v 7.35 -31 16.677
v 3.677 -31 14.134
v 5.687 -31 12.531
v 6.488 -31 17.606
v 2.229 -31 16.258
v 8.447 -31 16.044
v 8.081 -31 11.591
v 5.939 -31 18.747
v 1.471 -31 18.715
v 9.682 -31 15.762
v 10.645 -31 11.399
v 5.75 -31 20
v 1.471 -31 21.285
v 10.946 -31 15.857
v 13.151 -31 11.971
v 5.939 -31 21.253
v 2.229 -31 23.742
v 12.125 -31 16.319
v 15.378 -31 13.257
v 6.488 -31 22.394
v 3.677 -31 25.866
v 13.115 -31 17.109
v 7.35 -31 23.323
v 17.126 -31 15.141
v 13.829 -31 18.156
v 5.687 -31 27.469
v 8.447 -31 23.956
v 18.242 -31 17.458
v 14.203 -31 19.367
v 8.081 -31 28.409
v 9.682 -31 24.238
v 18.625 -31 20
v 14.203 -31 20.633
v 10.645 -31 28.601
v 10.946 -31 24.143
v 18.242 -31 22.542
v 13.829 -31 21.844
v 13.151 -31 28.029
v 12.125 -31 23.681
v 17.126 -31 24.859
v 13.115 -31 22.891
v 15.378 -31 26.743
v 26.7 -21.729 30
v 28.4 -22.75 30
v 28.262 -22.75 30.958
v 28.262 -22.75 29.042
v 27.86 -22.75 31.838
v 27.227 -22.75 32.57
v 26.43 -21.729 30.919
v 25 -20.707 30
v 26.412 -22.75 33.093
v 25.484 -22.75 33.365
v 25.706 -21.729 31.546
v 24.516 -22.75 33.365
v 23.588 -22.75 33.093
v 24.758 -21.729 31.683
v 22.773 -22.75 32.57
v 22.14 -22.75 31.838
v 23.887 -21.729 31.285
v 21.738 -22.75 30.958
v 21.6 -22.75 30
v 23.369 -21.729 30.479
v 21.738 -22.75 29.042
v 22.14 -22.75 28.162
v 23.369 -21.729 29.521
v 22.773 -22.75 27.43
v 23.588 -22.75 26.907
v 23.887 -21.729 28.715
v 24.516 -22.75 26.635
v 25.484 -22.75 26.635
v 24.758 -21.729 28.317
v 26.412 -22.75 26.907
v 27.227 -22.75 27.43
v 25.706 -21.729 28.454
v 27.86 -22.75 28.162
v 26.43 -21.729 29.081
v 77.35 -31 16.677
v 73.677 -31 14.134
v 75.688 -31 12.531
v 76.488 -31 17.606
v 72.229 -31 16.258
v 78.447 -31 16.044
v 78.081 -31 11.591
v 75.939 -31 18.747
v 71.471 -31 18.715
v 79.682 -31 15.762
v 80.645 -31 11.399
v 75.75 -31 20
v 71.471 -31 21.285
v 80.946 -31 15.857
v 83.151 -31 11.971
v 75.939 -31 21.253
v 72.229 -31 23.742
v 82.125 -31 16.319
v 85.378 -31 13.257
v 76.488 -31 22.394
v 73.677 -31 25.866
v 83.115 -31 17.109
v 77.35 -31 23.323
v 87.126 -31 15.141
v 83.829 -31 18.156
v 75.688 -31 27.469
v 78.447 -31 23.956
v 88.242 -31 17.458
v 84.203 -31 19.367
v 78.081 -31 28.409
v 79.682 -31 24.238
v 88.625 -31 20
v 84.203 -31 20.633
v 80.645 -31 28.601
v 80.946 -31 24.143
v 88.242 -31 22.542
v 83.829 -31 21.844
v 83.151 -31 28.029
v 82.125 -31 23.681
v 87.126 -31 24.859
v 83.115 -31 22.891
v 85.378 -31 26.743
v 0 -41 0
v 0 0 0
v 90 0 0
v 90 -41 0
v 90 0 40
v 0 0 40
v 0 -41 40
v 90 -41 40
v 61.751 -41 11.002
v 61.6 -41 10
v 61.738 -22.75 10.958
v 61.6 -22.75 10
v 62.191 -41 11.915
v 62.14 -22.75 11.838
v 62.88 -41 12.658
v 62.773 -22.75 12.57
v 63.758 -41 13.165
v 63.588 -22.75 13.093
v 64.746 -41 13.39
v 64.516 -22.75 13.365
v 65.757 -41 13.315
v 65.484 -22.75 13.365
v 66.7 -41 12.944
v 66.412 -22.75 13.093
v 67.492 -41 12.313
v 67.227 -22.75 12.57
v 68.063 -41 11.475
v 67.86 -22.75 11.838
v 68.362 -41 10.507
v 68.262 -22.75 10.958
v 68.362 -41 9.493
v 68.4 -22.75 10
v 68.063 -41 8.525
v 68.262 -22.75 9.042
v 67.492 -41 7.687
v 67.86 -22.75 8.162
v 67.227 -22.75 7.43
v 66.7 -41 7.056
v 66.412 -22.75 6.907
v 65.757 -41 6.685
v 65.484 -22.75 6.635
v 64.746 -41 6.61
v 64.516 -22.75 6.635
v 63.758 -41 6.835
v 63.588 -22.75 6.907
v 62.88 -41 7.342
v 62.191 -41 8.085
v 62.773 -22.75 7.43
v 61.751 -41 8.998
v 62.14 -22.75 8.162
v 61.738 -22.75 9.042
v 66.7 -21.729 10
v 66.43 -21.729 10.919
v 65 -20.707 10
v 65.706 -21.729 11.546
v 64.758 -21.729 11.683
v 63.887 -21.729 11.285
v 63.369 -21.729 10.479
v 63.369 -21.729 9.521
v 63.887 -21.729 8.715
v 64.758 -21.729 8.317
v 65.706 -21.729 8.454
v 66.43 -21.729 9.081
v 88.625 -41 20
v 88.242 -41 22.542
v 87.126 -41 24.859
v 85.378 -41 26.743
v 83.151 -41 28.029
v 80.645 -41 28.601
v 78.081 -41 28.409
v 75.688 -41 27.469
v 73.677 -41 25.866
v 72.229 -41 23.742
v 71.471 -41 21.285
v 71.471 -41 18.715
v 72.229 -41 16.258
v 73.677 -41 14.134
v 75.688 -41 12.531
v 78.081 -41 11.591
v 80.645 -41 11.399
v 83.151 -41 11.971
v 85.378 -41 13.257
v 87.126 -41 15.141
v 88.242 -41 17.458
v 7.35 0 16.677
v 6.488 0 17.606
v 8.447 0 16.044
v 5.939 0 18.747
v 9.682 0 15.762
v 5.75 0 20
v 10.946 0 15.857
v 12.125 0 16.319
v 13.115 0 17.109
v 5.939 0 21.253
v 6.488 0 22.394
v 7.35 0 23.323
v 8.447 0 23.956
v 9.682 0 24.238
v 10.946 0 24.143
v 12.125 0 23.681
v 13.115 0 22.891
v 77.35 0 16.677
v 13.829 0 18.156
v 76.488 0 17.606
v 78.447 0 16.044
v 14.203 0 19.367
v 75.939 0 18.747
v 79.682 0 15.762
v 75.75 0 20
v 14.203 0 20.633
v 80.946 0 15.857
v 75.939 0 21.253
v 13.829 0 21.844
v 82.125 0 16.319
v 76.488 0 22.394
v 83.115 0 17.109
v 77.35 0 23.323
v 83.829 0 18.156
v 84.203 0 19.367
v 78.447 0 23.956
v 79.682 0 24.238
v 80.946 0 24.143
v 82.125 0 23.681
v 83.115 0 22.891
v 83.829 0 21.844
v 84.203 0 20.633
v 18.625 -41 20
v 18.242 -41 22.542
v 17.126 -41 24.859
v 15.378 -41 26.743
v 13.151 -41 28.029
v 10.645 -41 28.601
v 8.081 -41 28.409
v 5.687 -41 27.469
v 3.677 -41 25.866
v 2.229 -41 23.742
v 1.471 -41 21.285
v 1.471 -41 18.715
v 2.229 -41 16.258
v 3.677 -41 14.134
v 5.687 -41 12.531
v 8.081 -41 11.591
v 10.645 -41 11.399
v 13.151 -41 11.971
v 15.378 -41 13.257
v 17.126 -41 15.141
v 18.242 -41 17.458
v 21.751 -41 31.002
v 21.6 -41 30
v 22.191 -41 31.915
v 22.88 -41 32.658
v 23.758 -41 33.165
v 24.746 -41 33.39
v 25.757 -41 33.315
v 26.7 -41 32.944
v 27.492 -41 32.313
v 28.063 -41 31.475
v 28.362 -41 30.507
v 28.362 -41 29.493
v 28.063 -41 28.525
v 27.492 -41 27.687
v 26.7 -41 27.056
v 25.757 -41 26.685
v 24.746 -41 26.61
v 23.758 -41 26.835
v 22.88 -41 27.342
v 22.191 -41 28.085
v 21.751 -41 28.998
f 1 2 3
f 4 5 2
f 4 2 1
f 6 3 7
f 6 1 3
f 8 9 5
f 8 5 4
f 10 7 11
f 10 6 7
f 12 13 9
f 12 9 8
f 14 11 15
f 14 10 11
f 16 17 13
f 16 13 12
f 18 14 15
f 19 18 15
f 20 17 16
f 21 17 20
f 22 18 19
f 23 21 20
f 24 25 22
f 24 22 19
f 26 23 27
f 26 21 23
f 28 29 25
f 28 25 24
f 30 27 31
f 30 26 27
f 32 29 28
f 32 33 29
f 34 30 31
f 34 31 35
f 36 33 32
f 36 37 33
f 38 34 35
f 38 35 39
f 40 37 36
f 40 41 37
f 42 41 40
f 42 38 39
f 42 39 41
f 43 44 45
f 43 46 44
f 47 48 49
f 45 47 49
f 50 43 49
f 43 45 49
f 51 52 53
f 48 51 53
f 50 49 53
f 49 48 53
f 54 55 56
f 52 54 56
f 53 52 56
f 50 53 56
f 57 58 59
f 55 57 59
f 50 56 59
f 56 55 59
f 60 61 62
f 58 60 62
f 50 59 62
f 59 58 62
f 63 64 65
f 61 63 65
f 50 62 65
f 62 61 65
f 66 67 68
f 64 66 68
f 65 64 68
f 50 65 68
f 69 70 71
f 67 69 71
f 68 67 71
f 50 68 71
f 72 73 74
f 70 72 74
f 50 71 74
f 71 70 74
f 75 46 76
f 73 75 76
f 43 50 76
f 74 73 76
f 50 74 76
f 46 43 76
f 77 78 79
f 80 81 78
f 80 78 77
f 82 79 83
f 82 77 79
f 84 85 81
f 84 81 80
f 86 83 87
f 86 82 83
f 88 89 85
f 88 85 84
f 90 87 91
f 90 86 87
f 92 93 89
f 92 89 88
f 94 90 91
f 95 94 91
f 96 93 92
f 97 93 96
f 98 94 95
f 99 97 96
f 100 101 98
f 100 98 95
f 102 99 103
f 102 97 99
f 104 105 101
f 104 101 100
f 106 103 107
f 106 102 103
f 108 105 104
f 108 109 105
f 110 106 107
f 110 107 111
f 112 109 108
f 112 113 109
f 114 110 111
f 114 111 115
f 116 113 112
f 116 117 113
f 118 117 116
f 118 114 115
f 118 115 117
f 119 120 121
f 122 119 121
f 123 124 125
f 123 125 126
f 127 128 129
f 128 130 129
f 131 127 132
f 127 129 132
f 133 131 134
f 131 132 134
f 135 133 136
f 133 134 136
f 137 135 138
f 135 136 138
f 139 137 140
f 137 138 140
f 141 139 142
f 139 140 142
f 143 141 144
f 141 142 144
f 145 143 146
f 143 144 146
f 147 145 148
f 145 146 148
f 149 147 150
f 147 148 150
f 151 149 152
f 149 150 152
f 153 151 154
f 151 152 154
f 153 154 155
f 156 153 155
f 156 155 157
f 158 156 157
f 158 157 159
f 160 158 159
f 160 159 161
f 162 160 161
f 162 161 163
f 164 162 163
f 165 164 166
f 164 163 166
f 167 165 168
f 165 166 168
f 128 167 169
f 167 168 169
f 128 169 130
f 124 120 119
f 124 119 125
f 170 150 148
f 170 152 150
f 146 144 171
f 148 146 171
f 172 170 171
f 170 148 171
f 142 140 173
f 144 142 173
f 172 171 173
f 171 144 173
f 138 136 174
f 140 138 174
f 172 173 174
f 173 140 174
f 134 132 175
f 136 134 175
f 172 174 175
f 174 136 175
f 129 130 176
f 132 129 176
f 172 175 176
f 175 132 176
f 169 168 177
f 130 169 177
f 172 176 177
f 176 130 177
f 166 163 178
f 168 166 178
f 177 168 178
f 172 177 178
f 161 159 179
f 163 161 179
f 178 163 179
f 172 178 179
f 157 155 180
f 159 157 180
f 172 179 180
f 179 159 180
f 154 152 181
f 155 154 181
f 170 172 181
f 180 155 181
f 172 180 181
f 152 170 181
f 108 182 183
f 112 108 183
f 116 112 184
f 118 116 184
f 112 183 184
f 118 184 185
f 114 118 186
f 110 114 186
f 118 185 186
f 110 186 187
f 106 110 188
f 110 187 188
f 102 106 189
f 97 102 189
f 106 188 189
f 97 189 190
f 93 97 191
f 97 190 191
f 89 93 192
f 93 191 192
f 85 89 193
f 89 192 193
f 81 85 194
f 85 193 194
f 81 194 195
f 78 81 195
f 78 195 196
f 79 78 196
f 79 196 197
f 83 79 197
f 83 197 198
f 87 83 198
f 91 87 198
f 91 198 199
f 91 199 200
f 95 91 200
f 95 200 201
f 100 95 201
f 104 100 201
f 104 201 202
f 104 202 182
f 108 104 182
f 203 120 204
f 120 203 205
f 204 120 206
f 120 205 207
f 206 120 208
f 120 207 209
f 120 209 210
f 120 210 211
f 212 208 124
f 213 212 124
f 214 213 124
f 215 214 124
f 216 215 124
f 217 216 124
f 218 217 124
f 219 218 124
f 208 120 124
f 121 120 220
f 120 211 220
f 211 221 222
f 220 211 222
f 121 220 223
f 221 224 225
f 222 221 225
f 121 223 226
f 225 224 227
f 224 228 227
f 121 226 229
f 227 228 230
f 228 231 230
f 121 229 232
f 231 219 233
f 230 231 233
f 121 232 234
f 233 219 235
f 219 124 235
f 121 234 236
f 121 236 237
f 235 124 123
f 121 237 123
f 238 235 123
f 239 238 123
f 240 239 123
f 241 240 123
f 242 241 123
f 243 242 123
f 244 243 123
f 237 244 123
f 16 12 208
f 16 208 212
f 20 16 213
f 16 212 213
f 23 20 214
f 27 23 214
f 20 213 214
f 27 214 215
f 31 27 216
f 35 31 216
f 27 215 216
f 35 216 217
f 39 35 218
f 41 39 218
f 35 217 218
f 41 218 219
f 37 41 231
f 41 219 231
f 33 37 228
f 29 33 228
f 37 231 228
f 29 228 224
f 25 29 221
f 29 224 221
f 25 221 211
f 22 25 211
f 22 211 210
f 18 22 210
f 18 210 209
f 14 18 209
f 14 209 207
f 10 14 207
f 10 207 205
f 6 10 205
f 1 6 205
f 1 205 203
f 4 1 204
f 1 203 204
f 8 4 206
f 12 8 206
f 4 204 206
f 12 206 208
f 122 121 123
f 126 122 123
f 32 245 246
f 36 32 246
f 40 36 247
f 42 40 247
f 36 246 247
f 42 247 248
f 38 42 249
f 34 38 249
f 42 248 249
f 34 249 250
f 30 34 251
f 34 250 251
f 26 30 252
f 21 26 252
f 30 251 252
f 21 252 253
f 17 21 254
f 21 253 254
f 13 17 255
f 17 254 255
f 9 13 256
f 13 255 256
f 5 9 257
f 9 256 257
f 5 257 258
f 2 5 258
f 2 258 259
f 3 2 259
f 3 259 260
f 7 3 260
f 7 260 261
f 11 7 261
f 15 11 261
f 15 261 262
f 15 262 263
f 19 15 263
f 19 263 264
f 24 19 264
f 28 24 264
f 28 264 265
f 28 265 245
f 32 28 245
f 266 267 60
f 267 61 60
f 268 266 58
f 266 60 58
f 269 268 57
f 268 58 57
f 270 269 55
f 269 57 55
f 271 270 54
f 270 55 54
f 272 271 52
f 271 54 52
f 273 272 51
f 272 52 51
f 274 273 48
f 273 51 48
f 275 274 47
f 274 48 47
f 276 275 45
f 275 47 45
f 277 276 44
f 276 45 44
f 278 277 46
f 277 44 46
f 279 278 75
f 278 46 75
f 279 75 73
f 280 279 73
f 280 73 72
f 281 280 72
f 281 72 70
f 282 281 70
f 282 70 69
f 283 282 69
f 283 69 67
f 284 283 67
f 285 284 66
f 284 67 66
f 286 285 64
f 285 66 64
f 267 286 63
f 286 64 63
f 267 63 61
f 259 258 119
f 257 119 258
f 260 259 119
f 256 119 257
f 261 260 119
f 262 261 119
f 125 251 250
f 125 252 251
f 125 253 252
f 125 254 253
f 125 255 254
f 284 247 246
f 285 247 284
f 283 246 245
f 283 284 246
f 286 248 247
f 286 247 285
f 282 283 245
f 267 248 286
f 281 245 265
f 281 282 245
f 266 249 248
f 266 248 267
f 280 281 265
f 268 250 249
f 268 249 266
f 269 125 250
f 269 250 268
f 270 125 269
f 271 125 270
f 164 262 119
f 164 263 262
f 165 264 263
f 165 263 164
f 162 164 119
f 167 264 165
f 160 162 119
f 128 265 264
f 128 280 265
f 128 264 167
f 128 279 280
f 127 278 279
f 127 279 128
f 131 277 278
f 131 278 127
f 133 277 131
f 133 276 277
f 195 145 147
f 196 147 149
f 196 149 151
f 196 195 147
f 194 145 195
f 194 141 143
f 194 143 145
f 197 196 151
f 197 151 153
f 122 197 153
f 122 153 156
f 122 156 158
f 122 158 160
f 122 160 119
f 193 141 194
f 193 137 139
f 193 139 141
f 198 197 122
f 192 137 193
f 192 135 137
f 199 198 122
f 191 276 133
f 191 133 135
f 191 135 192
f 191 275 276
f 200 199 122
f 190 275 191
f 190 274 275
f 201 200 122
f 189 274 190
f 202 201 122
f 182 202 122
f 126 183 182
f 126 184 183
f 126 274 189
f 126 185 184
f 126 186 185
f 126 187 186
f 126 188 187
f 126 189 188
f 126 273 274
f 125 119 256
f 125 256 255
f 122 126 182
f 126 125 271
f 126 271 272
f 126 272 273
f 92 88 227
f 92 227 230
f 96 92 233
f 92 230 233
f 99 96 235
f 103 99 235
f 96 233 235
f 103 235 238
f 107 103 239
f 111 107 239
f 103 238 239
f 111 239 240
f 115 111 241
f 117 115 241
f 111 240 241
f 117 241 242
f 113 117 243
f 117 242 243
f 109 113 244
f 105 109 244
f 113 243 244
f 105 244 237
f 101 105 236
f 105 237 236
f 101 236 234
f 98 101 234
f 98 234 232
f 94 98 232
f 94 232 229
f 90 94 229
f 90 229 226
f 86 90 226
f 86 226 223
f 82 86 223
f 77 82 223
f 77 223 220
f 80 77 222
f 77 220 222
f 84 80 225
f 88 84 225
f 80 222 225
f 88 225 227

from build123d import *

# Parameters (mm, degrees)
F0_W           = 90
F0_H           = 40
F1_DEPTH       = 41
F3_D           = 8.5
F3_CBORE_D     = 17.25
F3_CBORE_DEPTH = 10
F4_D           = 6.8
F4_DEPTH       = 18.25
F4_TIP         = 2.0429261047


with BuildPart() as f1:
    # F0 (on Front) → F1 (new body)
    with BuildSketch(Plane.XZ):
        with Locations((45, 20)):
            Rectangle(F0_W, F0_H)
    extrude(amount=F1_DEPTH)

    # F3 (through all)
    with Locations(Plane.XZ.offset(41)):
        with Locations((10, 20), (80, 20)):
            CounterBoreHole(F3_D / 2, F3_CBORE_D / 2, F3_CBORE_DEPTH)

    # F4
    with Locations(Plane.XZ.offset(41)):
        with Locations((25, 30), (65, 10)):
            Hole(F4_D / 2, depth=F4_DEPTH)
            with Locations((0, 0, -(F4_DEPTH + F4_TIP / 2))):  # 118° drill point
                Cone(0, F4_D / 2, F4_TIP, mode=Mode.SUBTRACT)


solid = f1.part
